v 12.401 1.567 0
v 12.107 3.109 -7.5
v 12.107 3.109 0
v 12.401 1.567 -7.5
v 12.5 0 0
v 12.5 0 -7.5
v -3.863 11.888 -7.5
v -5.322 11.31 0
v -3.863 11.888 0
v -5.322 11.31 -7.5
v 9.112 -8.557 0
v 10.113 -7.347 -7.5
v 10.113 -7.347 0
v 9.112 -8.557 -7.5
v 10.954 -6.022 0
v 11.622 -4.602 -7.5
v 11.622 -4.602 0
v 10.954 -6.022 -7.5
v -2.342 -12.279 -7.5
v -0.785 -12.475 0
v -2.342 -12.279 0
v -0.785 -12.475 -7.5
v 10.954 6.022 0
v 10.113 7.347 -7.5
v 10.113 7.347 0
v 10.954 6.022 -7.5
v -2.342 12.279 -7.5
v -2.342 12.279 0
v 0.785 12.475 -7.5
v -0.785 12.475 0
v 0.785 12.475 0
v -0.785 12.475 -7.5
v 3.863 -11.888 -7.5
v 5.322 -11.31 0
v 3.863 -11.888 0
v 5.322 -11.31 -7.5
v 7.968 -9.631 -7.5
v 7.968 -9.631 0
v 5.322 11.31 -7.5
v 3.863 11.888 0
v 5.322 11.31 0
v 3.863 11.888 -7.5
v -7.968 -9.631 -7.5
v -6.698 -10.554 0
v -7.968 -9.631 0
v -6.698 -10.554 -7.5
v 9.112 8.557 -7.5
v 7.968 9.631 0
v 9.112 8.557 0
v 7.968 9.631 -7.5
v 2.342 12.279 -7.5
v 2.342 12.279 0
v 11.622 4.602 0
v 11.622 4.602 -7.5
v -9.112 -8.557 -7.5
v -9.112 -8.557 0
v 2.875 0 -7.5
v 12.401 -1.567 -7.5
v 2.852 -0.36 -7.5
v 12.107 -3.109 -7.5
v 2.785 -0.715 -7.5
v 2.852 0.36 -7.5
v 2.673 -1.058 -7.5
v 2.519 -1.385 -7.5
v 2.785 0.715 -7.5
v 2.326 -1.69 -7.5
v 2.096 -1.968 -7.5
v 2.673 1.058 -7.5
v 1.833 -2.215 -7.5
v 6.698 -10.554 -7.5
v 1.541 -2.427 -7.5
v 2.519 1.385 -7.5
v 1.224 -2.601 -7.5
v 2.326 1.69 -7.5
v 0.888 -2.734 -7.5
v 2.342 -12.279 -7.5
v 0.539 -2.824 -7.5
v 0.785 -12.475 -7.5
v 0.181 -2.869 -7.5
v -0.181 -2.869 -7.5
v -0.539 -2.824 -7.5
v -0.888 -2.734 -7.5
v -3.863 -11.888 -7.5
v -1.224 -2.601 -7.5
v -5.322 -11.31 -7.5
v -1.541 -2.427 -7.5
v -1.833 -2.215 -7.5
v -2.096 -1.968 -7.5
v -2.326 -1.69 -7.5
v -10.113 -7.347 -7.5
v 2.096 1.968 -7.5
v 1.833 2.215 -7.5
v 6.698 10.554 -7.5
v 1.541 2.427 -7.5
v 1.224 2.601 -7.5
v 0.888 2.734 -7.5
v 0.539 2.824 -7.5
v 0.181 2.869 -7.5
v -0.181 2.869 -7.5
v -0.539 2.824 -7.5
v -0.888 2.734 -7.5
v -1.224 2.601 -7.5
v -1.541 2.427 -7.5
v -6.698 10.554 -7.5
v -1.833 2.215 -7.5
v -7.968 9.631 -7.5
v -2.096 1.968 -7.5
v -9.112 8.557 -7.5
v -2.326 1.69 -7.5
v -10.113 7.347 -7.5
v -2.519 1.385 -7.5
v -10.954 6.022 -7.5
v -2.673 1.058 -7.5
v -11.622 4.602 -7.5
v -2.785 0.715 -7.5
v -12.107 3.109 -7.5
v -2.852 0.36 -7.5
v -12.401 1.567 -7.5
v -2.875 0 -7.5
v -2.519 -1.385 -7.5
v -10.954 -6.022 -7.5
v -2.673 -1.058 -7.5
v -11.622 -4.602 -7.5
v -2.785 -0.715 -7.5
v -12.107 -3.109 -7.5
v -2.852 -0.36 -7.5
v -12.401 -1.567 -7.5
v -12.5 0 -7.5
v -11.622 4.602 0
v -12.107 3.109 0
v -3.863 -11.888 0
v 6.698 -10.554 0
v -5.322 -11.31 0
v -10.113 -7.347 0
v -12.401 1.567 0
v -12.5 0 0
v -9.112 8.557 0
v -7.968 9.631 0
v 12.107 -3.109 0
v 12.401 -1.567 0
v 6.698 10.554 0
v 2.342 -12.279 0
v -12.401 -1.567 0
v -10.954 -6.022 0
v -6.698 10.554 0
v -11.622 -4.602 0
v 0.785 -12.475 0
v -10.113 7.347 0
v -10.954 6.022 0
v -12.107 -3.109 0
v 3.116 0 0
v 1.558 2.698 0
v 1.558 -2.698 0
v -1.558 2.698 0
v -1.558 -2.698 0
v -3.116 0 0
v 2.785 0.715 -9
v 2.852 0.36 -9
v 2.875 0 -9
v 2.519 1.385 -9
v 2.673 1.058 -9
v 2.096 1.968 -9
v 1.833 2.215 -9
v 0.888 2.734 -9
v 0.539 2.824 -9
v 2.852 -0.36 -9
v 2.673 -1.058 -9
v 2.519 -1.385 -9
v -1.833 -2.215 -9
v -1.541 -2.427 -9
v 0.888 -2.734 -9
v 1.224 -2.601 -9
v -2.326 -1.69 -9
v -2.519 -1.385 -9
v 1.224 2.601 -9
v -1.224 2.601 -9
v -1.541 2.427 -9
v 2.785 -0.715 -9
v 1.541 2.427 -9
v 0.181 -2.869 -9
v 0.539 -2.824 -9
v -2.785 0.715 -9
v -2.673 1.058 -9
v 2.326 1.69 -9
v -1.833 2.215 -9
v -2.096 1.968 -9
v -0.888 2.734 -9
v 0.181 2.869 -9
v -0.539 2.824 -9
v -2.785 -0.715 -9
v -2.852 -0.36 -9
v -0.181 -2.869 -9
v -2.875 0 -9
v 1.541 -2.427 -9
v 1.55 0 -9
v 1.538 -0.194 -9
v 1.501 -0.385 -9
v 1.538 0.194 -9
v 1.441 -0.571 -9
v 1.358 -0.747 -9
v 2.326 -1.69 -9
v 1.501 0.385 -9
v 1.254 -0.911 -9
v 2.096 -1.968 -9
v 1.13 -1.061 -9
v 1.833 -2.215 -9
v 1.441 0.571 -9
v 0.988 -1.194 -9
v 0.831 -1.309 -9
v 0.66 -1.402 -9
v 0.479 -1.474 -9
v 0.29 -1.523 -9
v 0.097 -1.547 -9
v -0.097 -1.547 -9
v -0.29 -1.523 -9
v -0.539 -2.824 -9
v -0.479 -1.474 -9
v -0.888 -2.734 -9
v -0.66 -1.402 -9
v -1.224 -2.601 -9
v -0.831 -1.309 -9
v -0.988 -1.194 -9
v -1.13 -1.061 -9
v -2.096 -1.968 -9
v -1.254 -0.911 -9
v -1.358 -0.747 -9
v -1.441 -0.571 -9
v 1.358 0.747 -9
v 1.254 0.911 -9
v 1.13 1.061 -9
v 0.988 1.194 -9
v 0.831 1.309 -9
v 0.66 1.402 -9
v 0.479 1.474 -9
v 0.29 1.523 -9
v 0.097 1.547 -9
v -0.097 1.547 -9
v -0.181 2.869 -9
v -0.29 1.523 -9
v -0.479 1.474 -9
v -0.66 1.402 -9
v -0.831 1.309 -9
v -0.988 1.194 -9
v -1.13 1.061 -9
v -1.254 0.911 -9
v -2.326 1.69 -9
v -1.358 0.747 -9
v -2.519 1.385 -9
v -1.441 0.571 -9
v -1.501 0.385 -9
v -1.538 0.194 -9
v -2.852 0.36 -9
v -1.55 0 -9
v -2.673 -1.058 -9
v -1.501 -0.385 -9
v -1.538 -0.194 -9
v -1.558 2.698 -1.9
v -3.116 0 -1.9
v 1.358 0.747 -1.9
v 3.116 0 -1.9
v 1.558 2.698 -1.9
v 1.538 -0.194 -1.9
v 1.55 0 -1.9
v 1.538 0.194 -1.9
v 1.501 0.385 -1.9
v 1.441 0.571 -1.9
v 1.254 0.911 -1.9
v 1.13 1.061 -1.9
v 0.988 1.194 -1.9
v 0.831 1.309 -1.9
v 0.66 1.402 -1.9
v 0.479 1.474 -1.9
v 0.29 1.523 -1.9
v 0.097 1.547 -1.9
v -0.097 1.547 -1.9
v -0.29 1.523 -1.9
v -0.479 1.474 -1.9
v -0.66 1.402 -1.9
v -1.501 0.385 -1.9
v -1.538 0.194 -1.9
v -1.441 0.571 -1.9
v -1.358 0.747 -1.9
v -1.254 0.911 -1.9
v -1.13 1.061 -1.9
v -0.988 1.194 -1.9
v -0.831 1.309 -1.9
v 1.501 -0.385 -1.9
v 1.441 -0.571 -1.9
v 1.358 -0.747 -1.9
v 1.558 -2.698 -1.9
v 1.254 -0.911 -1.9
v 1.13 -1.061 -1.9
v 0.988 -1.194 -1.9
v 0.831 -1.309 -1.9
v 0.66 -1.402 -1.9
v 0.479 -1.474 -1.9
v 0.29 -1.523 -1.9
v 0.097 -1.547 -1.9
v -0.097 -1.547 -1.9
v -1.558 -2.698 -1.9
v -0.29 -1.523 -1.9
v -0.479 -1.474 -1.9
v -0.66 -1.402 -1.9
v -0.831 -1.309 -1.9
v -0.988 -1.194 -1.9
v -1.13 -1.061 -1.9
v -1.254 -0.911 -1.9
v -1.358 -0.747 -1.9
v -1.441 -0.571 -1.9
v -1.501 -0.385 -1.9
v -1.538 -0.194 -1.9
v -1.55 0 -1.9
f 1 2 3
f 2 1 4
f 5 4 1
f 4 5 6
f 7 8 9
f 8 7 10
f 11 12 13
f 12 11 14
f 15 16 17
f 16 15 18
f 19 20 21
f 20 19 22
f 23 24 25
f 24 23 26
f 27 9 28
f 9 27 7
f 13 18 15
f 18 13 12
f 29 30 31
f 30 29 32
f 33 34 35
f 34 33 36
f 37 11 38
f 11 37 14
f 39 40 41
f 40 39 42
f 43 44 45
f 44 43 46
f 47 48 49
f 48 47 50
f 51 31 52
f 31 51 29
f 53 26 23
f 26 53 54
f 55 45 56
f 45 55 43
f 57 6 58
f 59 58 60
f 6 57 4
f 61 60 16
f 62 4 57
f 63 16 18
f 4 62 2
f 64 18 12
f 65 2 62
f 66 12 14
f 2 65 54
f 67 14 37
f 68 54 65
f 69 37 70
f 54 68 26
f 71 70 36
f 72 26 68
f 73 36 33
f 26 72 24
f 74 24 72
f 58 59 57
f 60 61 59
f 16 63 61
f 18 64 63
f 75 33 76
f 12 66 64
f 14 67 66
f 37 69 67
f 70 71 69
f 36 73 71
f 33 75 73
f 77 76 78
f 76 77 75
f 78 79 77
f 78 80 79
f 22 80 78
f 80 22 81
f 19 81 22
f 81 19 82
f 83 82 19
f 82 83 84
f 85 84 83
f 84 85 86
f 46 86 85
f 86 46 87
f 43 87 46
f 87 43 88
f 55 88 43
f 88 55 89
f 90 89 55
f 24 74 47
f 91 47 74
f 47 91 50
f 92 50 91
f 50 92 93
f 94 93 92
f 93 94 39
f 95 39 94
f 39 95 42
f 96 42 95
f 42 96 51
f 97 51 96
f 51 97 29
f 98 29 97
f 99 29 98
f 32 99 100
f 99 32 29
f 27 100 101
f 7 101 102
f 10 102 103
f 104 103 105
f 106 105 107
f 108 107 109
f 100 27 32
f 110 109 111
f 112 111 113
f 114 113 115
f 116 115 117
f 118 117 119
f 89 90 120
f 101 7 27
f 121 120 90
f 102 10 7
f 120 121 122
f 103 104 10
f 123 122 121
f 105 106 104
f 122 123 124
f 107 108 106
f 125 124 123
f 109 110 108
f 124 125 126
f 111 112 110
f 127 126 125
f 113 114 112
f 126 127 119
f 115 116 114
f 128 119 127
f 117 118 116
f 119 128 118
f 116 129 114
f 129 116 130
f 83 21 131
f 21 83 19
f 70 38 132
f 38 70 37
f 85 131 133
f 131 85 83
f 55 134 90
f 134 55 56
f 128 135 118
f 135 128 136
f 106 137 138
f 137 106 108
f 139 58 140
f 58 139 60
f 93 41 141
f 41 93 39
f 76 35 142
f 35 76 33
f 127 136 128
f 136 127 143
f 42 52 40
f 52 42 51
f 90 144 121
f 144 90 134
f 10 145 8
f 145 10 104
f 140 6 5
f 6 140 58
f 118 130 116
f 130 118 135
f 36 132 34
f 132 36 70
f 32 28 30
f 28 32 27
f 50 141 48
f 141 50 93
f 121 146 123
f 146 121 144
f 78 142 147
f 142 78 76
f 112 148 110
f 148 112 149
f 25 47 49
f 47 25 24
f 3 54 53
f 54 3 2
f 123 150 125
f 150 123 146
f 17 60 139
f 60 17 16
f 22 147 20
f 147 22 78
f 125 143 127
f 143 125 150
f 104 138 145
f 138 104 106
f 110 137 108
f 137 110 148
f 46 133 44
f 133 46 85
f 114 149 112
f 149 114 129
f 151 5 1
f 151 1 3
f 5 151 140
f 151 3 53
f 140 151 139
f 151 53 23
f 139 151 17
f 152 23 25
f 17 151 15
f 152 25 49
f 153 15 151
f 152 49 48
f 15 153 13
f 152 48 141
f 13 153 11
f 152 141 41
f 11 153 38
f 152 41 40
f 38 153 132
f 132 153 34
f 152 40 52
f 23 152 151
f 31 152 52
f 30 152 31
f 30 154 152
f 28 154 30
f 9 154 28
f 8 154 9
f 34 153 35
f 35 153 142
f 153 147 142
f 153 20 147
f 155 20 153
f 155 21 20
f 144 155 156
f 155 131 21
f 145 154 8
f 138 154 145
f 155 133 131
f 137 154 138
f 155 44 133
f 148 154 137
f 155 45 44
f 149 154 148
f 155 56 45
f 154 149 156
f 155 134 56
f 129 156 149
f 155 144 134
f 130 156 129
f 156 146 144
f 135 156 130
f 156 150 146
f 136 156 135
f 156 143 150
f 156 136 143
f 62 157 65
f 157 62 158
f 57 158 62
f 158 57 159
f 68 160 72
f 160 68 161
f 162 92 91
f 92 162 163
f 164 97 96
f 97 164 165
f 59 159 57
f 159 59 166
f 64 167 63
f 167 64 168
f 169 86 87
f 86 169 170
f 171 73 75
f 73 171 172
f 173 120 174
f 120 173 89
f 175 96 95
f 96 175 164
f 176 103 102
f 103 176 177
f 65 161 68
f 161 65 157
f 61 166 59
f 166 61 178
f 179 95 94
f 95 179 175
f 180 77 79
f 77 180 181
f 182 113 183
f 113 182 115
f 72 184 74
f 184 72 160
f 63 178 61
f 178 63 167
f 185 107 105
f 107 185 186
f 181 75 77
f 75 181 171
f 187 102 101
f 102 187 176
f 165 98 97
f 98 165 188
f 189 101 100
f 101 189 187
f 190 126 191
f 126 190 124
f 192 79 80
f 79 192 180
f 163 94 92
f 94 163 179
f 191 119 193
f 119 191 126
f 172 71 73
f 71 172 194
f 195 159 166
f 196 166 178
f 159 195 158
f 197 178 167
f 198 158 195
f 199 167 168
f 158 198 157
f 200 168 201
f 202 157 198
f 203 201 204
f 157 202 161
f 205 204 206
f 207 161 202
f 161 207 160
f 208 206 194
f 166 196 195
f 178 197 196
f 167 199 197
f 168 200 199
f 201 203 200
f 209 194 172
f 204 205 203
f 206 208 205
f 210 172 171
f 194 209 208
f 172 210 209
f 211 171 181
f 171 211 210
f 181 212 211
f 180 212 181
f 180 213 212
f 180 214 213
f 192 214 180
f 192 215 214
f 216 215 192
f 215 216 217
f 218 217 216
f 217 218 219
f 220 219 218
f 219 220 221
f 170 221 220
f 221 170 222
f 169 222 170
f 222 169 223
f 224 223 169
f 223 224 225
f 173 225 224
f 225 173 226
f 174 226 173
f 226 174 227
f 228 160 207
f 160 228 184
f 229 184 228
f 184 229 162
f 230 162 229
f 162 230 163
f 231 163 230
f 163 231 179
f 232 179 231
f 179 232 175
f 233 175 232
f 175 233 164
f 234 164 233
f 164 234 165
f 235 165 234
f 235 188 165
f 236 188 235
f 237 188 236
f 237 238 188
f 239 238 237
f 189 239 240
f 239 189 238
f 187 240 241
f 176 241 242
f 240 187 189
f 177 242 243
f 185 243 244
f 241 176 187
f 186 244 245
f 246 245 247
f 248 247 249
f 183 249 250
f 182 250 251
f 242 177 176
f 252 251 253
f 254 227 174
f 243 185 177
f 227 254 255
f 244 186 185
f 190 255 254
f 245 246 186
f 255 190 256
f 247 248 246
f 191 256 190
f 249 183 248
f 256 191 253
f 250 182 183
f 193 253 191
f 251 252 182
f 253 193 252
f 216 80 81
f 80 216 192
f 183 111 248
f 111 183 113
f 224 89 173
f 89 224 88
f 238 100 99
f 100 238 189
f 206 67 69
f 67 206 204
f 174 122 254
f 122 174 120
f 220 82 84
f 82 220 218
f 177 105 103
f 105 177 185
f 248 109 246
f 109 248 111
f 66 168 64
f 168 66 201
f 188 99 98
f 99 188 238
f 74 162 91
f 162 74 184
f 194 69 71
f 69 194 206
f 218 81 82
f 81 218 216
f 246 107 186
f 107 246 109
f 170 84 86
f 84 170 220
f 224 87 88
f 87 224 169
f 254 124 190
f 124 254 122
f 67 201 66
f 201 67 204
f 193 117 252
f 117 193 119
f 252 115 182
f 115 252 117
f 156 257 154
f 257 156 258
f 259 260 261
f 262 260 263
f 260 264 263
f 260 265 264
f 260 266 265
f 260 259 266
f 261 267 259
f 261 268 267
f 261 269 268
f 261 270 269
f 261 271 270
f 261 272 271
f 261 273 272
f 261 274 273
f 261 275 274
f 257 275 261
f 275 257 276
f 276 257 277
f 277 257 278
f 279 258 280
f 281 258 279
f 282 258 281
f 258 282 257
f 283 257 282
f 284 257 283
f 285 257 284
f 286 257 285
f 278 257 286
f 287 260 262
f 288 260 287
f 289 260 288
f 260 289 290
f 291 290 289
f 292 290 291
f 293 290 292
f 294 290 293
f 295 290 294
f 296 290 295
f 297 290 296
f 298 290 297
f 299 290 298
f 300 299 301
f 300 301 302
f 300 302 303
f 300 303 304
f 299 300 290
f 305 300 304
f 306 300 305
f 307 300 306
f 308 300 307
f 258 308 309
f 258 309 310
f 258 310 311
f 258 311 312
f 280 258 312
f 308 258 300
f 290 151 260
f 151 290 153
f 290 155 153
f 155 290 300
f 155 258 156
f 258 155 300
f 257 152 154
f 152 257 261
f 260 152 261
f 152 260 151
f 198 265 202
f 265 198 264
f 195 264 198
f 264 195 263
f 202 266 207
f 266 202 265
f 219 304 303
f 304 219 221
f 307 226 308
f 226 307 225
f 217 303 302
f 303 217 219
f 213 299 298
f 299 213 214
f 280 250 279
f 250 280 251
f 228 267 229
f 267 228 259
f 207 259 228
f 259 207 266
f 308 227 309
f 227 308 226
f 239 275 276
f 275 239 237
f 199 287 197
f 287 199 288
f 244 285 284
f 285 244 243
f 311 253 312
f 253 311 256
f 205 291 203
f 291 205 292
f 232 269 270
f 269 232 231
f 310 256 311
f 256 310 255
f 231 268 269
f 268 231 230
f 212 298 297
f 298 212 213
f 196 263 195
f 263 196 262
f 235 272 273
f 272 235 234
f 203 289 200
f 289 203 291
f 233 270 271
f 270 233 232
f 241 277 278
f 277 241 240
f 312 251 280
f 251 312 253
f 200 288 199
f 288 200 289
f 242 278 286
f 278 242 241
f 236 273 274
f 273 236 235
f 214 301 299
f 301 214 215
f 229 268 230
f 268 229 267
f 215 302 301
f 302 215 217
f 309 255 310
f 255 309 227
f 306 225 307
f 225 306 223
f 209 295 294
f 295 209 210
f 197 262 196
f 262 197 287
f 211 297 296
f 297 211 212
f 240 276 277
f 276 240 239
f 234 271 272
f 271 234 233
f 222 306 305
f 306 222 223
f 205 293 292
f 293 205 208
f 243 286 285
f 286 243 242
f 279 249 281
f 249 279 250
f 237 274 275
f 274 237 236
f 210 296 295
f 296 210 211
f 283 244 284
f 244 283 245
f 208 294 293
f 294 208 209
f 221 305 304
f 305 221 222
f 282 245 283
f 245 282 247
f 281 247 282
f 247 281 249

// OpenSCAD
$fn = 50;

difference() {
	union() {
		translate(v = [0, 0, -7.5]) {
			cylinder(h = 7.5, r = 12.5);
		}
		#translate(v = [0, 0, -9.0]) {
			cylinder(h = 9, r = 2.875);
		}
	}
	union() {
		translate(v = [0, 0, 0]) {
			rotate(a = [0, 0, 0]) {
				difference() {
					union() {
						translate(v = [0, 0, -1.9]) {
							linear_extrude(height = 1.9) {
								polygon(points = [[3.1158, 0.0], [1.5579000000000005, 2.698361953111554], [-1.5578999999999994, 2.6983619531115544], [-3.1158, 3.815754496783323e-16], [-1.5579000000000014, -2.6983619531115535], [1.557899999999998, -2.6983619531115552]]);
							}
						}
					}
					union();
				}
			}
		}
		#translate(v = [0, 0, -100.0]) {
			cylinder(h = 200, r = 1.55);
		}
	}
}
